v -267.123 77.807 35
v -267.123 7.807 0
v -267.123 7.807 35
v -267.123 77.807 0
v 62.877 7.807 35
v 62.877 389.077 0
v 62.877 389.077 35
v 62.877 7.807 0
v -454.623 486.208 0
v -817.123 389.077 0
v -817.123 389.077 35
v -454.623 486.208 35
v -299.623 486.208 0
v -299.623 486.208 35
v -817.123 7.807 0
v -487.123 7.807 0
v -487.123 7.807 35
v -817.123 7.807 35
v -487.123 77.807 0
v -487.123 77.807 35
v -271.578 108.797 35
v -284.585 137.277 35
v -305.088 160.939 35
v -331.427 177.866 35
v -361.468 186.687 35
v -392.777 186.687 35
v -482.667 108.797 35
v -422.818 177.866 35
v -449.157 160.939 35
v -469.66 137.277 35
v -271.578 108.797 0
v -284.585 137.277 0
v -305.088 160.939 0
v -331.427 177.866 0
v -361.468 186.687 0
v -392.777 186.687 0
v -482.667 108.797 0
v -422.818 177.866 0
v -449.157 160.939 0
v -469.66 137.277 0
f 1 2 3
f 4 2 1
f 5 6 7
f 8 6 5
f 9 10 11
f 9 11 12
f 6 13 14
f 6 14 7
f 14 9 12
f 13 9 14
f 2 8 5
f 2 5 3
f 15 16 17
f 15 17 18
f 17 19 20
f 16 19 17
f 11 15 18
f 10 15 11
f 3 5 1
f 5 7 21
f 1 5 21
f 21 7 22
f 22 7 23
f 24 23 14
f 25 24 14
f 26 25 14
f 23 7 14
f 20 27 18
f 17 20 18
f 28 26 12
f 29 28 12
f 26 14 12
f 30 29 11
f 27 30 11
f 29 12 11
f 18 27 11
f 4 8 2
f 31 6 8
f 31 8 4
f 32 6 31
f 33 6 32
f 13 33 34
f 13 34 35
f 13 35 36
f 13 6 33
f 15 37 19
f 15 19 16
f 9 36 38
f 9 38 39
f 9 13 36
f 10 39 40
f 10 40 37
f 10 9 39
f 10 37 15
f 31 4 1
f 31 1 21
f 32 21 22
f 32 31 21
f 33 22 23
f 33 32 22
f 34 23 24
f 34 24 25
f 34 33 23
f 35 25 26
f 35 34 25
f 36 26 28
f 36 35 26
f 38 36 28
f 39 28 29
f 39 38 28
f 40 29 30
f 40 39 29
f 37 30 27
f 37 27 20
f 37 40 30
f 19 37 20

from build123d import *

# Parameters (mm, degrees)
AUFSATZ_LINEAR_AUSTRAGEN1_DEPTH = 35


with BuildPart() as part:
    # Skizze1 → Aufsatz-Linear austragen1 (new body)
    with BuildSketch(Plane.XY):
        with BuildLine():
            Line((62.877451446, 389.076644167), (62.877451446, 7.806644167))
            Line((62.877451446, 7.806644167), (-267.122548554, 7.806644167))
            Line((-267.122548554, 7.806644167), (-267.122548554, 77.806644167))
            ThreePointArc((-267.122548554, 77.806644167), (-377.122548554, 187.806644167), (-487.122548554, 77.806644167))
            Line((-487.122548554, 77.806644167), (-487.122548554, 7.806644167))
            Line((-487.122548554, 7.806644167), (-817.122548554, 7.806644167))
            Line((-817.122548554, 7.806644167), (-817.122548554, 389.076644167))
            Line((-817.122548554, 389.076644167), (-454.622548554, 486.208226423))
            Line((-454.622548554, 486.208226423), (-299.622548554, 486.208226423))
            Line((-299.622548554, 486.208226423), (62.877451446, 389.076644167))
        make_face()
    extrude(amount=AUFSATZ_LINEAR_AUSTRAGEN1_DEPTH)


solid = part.part
